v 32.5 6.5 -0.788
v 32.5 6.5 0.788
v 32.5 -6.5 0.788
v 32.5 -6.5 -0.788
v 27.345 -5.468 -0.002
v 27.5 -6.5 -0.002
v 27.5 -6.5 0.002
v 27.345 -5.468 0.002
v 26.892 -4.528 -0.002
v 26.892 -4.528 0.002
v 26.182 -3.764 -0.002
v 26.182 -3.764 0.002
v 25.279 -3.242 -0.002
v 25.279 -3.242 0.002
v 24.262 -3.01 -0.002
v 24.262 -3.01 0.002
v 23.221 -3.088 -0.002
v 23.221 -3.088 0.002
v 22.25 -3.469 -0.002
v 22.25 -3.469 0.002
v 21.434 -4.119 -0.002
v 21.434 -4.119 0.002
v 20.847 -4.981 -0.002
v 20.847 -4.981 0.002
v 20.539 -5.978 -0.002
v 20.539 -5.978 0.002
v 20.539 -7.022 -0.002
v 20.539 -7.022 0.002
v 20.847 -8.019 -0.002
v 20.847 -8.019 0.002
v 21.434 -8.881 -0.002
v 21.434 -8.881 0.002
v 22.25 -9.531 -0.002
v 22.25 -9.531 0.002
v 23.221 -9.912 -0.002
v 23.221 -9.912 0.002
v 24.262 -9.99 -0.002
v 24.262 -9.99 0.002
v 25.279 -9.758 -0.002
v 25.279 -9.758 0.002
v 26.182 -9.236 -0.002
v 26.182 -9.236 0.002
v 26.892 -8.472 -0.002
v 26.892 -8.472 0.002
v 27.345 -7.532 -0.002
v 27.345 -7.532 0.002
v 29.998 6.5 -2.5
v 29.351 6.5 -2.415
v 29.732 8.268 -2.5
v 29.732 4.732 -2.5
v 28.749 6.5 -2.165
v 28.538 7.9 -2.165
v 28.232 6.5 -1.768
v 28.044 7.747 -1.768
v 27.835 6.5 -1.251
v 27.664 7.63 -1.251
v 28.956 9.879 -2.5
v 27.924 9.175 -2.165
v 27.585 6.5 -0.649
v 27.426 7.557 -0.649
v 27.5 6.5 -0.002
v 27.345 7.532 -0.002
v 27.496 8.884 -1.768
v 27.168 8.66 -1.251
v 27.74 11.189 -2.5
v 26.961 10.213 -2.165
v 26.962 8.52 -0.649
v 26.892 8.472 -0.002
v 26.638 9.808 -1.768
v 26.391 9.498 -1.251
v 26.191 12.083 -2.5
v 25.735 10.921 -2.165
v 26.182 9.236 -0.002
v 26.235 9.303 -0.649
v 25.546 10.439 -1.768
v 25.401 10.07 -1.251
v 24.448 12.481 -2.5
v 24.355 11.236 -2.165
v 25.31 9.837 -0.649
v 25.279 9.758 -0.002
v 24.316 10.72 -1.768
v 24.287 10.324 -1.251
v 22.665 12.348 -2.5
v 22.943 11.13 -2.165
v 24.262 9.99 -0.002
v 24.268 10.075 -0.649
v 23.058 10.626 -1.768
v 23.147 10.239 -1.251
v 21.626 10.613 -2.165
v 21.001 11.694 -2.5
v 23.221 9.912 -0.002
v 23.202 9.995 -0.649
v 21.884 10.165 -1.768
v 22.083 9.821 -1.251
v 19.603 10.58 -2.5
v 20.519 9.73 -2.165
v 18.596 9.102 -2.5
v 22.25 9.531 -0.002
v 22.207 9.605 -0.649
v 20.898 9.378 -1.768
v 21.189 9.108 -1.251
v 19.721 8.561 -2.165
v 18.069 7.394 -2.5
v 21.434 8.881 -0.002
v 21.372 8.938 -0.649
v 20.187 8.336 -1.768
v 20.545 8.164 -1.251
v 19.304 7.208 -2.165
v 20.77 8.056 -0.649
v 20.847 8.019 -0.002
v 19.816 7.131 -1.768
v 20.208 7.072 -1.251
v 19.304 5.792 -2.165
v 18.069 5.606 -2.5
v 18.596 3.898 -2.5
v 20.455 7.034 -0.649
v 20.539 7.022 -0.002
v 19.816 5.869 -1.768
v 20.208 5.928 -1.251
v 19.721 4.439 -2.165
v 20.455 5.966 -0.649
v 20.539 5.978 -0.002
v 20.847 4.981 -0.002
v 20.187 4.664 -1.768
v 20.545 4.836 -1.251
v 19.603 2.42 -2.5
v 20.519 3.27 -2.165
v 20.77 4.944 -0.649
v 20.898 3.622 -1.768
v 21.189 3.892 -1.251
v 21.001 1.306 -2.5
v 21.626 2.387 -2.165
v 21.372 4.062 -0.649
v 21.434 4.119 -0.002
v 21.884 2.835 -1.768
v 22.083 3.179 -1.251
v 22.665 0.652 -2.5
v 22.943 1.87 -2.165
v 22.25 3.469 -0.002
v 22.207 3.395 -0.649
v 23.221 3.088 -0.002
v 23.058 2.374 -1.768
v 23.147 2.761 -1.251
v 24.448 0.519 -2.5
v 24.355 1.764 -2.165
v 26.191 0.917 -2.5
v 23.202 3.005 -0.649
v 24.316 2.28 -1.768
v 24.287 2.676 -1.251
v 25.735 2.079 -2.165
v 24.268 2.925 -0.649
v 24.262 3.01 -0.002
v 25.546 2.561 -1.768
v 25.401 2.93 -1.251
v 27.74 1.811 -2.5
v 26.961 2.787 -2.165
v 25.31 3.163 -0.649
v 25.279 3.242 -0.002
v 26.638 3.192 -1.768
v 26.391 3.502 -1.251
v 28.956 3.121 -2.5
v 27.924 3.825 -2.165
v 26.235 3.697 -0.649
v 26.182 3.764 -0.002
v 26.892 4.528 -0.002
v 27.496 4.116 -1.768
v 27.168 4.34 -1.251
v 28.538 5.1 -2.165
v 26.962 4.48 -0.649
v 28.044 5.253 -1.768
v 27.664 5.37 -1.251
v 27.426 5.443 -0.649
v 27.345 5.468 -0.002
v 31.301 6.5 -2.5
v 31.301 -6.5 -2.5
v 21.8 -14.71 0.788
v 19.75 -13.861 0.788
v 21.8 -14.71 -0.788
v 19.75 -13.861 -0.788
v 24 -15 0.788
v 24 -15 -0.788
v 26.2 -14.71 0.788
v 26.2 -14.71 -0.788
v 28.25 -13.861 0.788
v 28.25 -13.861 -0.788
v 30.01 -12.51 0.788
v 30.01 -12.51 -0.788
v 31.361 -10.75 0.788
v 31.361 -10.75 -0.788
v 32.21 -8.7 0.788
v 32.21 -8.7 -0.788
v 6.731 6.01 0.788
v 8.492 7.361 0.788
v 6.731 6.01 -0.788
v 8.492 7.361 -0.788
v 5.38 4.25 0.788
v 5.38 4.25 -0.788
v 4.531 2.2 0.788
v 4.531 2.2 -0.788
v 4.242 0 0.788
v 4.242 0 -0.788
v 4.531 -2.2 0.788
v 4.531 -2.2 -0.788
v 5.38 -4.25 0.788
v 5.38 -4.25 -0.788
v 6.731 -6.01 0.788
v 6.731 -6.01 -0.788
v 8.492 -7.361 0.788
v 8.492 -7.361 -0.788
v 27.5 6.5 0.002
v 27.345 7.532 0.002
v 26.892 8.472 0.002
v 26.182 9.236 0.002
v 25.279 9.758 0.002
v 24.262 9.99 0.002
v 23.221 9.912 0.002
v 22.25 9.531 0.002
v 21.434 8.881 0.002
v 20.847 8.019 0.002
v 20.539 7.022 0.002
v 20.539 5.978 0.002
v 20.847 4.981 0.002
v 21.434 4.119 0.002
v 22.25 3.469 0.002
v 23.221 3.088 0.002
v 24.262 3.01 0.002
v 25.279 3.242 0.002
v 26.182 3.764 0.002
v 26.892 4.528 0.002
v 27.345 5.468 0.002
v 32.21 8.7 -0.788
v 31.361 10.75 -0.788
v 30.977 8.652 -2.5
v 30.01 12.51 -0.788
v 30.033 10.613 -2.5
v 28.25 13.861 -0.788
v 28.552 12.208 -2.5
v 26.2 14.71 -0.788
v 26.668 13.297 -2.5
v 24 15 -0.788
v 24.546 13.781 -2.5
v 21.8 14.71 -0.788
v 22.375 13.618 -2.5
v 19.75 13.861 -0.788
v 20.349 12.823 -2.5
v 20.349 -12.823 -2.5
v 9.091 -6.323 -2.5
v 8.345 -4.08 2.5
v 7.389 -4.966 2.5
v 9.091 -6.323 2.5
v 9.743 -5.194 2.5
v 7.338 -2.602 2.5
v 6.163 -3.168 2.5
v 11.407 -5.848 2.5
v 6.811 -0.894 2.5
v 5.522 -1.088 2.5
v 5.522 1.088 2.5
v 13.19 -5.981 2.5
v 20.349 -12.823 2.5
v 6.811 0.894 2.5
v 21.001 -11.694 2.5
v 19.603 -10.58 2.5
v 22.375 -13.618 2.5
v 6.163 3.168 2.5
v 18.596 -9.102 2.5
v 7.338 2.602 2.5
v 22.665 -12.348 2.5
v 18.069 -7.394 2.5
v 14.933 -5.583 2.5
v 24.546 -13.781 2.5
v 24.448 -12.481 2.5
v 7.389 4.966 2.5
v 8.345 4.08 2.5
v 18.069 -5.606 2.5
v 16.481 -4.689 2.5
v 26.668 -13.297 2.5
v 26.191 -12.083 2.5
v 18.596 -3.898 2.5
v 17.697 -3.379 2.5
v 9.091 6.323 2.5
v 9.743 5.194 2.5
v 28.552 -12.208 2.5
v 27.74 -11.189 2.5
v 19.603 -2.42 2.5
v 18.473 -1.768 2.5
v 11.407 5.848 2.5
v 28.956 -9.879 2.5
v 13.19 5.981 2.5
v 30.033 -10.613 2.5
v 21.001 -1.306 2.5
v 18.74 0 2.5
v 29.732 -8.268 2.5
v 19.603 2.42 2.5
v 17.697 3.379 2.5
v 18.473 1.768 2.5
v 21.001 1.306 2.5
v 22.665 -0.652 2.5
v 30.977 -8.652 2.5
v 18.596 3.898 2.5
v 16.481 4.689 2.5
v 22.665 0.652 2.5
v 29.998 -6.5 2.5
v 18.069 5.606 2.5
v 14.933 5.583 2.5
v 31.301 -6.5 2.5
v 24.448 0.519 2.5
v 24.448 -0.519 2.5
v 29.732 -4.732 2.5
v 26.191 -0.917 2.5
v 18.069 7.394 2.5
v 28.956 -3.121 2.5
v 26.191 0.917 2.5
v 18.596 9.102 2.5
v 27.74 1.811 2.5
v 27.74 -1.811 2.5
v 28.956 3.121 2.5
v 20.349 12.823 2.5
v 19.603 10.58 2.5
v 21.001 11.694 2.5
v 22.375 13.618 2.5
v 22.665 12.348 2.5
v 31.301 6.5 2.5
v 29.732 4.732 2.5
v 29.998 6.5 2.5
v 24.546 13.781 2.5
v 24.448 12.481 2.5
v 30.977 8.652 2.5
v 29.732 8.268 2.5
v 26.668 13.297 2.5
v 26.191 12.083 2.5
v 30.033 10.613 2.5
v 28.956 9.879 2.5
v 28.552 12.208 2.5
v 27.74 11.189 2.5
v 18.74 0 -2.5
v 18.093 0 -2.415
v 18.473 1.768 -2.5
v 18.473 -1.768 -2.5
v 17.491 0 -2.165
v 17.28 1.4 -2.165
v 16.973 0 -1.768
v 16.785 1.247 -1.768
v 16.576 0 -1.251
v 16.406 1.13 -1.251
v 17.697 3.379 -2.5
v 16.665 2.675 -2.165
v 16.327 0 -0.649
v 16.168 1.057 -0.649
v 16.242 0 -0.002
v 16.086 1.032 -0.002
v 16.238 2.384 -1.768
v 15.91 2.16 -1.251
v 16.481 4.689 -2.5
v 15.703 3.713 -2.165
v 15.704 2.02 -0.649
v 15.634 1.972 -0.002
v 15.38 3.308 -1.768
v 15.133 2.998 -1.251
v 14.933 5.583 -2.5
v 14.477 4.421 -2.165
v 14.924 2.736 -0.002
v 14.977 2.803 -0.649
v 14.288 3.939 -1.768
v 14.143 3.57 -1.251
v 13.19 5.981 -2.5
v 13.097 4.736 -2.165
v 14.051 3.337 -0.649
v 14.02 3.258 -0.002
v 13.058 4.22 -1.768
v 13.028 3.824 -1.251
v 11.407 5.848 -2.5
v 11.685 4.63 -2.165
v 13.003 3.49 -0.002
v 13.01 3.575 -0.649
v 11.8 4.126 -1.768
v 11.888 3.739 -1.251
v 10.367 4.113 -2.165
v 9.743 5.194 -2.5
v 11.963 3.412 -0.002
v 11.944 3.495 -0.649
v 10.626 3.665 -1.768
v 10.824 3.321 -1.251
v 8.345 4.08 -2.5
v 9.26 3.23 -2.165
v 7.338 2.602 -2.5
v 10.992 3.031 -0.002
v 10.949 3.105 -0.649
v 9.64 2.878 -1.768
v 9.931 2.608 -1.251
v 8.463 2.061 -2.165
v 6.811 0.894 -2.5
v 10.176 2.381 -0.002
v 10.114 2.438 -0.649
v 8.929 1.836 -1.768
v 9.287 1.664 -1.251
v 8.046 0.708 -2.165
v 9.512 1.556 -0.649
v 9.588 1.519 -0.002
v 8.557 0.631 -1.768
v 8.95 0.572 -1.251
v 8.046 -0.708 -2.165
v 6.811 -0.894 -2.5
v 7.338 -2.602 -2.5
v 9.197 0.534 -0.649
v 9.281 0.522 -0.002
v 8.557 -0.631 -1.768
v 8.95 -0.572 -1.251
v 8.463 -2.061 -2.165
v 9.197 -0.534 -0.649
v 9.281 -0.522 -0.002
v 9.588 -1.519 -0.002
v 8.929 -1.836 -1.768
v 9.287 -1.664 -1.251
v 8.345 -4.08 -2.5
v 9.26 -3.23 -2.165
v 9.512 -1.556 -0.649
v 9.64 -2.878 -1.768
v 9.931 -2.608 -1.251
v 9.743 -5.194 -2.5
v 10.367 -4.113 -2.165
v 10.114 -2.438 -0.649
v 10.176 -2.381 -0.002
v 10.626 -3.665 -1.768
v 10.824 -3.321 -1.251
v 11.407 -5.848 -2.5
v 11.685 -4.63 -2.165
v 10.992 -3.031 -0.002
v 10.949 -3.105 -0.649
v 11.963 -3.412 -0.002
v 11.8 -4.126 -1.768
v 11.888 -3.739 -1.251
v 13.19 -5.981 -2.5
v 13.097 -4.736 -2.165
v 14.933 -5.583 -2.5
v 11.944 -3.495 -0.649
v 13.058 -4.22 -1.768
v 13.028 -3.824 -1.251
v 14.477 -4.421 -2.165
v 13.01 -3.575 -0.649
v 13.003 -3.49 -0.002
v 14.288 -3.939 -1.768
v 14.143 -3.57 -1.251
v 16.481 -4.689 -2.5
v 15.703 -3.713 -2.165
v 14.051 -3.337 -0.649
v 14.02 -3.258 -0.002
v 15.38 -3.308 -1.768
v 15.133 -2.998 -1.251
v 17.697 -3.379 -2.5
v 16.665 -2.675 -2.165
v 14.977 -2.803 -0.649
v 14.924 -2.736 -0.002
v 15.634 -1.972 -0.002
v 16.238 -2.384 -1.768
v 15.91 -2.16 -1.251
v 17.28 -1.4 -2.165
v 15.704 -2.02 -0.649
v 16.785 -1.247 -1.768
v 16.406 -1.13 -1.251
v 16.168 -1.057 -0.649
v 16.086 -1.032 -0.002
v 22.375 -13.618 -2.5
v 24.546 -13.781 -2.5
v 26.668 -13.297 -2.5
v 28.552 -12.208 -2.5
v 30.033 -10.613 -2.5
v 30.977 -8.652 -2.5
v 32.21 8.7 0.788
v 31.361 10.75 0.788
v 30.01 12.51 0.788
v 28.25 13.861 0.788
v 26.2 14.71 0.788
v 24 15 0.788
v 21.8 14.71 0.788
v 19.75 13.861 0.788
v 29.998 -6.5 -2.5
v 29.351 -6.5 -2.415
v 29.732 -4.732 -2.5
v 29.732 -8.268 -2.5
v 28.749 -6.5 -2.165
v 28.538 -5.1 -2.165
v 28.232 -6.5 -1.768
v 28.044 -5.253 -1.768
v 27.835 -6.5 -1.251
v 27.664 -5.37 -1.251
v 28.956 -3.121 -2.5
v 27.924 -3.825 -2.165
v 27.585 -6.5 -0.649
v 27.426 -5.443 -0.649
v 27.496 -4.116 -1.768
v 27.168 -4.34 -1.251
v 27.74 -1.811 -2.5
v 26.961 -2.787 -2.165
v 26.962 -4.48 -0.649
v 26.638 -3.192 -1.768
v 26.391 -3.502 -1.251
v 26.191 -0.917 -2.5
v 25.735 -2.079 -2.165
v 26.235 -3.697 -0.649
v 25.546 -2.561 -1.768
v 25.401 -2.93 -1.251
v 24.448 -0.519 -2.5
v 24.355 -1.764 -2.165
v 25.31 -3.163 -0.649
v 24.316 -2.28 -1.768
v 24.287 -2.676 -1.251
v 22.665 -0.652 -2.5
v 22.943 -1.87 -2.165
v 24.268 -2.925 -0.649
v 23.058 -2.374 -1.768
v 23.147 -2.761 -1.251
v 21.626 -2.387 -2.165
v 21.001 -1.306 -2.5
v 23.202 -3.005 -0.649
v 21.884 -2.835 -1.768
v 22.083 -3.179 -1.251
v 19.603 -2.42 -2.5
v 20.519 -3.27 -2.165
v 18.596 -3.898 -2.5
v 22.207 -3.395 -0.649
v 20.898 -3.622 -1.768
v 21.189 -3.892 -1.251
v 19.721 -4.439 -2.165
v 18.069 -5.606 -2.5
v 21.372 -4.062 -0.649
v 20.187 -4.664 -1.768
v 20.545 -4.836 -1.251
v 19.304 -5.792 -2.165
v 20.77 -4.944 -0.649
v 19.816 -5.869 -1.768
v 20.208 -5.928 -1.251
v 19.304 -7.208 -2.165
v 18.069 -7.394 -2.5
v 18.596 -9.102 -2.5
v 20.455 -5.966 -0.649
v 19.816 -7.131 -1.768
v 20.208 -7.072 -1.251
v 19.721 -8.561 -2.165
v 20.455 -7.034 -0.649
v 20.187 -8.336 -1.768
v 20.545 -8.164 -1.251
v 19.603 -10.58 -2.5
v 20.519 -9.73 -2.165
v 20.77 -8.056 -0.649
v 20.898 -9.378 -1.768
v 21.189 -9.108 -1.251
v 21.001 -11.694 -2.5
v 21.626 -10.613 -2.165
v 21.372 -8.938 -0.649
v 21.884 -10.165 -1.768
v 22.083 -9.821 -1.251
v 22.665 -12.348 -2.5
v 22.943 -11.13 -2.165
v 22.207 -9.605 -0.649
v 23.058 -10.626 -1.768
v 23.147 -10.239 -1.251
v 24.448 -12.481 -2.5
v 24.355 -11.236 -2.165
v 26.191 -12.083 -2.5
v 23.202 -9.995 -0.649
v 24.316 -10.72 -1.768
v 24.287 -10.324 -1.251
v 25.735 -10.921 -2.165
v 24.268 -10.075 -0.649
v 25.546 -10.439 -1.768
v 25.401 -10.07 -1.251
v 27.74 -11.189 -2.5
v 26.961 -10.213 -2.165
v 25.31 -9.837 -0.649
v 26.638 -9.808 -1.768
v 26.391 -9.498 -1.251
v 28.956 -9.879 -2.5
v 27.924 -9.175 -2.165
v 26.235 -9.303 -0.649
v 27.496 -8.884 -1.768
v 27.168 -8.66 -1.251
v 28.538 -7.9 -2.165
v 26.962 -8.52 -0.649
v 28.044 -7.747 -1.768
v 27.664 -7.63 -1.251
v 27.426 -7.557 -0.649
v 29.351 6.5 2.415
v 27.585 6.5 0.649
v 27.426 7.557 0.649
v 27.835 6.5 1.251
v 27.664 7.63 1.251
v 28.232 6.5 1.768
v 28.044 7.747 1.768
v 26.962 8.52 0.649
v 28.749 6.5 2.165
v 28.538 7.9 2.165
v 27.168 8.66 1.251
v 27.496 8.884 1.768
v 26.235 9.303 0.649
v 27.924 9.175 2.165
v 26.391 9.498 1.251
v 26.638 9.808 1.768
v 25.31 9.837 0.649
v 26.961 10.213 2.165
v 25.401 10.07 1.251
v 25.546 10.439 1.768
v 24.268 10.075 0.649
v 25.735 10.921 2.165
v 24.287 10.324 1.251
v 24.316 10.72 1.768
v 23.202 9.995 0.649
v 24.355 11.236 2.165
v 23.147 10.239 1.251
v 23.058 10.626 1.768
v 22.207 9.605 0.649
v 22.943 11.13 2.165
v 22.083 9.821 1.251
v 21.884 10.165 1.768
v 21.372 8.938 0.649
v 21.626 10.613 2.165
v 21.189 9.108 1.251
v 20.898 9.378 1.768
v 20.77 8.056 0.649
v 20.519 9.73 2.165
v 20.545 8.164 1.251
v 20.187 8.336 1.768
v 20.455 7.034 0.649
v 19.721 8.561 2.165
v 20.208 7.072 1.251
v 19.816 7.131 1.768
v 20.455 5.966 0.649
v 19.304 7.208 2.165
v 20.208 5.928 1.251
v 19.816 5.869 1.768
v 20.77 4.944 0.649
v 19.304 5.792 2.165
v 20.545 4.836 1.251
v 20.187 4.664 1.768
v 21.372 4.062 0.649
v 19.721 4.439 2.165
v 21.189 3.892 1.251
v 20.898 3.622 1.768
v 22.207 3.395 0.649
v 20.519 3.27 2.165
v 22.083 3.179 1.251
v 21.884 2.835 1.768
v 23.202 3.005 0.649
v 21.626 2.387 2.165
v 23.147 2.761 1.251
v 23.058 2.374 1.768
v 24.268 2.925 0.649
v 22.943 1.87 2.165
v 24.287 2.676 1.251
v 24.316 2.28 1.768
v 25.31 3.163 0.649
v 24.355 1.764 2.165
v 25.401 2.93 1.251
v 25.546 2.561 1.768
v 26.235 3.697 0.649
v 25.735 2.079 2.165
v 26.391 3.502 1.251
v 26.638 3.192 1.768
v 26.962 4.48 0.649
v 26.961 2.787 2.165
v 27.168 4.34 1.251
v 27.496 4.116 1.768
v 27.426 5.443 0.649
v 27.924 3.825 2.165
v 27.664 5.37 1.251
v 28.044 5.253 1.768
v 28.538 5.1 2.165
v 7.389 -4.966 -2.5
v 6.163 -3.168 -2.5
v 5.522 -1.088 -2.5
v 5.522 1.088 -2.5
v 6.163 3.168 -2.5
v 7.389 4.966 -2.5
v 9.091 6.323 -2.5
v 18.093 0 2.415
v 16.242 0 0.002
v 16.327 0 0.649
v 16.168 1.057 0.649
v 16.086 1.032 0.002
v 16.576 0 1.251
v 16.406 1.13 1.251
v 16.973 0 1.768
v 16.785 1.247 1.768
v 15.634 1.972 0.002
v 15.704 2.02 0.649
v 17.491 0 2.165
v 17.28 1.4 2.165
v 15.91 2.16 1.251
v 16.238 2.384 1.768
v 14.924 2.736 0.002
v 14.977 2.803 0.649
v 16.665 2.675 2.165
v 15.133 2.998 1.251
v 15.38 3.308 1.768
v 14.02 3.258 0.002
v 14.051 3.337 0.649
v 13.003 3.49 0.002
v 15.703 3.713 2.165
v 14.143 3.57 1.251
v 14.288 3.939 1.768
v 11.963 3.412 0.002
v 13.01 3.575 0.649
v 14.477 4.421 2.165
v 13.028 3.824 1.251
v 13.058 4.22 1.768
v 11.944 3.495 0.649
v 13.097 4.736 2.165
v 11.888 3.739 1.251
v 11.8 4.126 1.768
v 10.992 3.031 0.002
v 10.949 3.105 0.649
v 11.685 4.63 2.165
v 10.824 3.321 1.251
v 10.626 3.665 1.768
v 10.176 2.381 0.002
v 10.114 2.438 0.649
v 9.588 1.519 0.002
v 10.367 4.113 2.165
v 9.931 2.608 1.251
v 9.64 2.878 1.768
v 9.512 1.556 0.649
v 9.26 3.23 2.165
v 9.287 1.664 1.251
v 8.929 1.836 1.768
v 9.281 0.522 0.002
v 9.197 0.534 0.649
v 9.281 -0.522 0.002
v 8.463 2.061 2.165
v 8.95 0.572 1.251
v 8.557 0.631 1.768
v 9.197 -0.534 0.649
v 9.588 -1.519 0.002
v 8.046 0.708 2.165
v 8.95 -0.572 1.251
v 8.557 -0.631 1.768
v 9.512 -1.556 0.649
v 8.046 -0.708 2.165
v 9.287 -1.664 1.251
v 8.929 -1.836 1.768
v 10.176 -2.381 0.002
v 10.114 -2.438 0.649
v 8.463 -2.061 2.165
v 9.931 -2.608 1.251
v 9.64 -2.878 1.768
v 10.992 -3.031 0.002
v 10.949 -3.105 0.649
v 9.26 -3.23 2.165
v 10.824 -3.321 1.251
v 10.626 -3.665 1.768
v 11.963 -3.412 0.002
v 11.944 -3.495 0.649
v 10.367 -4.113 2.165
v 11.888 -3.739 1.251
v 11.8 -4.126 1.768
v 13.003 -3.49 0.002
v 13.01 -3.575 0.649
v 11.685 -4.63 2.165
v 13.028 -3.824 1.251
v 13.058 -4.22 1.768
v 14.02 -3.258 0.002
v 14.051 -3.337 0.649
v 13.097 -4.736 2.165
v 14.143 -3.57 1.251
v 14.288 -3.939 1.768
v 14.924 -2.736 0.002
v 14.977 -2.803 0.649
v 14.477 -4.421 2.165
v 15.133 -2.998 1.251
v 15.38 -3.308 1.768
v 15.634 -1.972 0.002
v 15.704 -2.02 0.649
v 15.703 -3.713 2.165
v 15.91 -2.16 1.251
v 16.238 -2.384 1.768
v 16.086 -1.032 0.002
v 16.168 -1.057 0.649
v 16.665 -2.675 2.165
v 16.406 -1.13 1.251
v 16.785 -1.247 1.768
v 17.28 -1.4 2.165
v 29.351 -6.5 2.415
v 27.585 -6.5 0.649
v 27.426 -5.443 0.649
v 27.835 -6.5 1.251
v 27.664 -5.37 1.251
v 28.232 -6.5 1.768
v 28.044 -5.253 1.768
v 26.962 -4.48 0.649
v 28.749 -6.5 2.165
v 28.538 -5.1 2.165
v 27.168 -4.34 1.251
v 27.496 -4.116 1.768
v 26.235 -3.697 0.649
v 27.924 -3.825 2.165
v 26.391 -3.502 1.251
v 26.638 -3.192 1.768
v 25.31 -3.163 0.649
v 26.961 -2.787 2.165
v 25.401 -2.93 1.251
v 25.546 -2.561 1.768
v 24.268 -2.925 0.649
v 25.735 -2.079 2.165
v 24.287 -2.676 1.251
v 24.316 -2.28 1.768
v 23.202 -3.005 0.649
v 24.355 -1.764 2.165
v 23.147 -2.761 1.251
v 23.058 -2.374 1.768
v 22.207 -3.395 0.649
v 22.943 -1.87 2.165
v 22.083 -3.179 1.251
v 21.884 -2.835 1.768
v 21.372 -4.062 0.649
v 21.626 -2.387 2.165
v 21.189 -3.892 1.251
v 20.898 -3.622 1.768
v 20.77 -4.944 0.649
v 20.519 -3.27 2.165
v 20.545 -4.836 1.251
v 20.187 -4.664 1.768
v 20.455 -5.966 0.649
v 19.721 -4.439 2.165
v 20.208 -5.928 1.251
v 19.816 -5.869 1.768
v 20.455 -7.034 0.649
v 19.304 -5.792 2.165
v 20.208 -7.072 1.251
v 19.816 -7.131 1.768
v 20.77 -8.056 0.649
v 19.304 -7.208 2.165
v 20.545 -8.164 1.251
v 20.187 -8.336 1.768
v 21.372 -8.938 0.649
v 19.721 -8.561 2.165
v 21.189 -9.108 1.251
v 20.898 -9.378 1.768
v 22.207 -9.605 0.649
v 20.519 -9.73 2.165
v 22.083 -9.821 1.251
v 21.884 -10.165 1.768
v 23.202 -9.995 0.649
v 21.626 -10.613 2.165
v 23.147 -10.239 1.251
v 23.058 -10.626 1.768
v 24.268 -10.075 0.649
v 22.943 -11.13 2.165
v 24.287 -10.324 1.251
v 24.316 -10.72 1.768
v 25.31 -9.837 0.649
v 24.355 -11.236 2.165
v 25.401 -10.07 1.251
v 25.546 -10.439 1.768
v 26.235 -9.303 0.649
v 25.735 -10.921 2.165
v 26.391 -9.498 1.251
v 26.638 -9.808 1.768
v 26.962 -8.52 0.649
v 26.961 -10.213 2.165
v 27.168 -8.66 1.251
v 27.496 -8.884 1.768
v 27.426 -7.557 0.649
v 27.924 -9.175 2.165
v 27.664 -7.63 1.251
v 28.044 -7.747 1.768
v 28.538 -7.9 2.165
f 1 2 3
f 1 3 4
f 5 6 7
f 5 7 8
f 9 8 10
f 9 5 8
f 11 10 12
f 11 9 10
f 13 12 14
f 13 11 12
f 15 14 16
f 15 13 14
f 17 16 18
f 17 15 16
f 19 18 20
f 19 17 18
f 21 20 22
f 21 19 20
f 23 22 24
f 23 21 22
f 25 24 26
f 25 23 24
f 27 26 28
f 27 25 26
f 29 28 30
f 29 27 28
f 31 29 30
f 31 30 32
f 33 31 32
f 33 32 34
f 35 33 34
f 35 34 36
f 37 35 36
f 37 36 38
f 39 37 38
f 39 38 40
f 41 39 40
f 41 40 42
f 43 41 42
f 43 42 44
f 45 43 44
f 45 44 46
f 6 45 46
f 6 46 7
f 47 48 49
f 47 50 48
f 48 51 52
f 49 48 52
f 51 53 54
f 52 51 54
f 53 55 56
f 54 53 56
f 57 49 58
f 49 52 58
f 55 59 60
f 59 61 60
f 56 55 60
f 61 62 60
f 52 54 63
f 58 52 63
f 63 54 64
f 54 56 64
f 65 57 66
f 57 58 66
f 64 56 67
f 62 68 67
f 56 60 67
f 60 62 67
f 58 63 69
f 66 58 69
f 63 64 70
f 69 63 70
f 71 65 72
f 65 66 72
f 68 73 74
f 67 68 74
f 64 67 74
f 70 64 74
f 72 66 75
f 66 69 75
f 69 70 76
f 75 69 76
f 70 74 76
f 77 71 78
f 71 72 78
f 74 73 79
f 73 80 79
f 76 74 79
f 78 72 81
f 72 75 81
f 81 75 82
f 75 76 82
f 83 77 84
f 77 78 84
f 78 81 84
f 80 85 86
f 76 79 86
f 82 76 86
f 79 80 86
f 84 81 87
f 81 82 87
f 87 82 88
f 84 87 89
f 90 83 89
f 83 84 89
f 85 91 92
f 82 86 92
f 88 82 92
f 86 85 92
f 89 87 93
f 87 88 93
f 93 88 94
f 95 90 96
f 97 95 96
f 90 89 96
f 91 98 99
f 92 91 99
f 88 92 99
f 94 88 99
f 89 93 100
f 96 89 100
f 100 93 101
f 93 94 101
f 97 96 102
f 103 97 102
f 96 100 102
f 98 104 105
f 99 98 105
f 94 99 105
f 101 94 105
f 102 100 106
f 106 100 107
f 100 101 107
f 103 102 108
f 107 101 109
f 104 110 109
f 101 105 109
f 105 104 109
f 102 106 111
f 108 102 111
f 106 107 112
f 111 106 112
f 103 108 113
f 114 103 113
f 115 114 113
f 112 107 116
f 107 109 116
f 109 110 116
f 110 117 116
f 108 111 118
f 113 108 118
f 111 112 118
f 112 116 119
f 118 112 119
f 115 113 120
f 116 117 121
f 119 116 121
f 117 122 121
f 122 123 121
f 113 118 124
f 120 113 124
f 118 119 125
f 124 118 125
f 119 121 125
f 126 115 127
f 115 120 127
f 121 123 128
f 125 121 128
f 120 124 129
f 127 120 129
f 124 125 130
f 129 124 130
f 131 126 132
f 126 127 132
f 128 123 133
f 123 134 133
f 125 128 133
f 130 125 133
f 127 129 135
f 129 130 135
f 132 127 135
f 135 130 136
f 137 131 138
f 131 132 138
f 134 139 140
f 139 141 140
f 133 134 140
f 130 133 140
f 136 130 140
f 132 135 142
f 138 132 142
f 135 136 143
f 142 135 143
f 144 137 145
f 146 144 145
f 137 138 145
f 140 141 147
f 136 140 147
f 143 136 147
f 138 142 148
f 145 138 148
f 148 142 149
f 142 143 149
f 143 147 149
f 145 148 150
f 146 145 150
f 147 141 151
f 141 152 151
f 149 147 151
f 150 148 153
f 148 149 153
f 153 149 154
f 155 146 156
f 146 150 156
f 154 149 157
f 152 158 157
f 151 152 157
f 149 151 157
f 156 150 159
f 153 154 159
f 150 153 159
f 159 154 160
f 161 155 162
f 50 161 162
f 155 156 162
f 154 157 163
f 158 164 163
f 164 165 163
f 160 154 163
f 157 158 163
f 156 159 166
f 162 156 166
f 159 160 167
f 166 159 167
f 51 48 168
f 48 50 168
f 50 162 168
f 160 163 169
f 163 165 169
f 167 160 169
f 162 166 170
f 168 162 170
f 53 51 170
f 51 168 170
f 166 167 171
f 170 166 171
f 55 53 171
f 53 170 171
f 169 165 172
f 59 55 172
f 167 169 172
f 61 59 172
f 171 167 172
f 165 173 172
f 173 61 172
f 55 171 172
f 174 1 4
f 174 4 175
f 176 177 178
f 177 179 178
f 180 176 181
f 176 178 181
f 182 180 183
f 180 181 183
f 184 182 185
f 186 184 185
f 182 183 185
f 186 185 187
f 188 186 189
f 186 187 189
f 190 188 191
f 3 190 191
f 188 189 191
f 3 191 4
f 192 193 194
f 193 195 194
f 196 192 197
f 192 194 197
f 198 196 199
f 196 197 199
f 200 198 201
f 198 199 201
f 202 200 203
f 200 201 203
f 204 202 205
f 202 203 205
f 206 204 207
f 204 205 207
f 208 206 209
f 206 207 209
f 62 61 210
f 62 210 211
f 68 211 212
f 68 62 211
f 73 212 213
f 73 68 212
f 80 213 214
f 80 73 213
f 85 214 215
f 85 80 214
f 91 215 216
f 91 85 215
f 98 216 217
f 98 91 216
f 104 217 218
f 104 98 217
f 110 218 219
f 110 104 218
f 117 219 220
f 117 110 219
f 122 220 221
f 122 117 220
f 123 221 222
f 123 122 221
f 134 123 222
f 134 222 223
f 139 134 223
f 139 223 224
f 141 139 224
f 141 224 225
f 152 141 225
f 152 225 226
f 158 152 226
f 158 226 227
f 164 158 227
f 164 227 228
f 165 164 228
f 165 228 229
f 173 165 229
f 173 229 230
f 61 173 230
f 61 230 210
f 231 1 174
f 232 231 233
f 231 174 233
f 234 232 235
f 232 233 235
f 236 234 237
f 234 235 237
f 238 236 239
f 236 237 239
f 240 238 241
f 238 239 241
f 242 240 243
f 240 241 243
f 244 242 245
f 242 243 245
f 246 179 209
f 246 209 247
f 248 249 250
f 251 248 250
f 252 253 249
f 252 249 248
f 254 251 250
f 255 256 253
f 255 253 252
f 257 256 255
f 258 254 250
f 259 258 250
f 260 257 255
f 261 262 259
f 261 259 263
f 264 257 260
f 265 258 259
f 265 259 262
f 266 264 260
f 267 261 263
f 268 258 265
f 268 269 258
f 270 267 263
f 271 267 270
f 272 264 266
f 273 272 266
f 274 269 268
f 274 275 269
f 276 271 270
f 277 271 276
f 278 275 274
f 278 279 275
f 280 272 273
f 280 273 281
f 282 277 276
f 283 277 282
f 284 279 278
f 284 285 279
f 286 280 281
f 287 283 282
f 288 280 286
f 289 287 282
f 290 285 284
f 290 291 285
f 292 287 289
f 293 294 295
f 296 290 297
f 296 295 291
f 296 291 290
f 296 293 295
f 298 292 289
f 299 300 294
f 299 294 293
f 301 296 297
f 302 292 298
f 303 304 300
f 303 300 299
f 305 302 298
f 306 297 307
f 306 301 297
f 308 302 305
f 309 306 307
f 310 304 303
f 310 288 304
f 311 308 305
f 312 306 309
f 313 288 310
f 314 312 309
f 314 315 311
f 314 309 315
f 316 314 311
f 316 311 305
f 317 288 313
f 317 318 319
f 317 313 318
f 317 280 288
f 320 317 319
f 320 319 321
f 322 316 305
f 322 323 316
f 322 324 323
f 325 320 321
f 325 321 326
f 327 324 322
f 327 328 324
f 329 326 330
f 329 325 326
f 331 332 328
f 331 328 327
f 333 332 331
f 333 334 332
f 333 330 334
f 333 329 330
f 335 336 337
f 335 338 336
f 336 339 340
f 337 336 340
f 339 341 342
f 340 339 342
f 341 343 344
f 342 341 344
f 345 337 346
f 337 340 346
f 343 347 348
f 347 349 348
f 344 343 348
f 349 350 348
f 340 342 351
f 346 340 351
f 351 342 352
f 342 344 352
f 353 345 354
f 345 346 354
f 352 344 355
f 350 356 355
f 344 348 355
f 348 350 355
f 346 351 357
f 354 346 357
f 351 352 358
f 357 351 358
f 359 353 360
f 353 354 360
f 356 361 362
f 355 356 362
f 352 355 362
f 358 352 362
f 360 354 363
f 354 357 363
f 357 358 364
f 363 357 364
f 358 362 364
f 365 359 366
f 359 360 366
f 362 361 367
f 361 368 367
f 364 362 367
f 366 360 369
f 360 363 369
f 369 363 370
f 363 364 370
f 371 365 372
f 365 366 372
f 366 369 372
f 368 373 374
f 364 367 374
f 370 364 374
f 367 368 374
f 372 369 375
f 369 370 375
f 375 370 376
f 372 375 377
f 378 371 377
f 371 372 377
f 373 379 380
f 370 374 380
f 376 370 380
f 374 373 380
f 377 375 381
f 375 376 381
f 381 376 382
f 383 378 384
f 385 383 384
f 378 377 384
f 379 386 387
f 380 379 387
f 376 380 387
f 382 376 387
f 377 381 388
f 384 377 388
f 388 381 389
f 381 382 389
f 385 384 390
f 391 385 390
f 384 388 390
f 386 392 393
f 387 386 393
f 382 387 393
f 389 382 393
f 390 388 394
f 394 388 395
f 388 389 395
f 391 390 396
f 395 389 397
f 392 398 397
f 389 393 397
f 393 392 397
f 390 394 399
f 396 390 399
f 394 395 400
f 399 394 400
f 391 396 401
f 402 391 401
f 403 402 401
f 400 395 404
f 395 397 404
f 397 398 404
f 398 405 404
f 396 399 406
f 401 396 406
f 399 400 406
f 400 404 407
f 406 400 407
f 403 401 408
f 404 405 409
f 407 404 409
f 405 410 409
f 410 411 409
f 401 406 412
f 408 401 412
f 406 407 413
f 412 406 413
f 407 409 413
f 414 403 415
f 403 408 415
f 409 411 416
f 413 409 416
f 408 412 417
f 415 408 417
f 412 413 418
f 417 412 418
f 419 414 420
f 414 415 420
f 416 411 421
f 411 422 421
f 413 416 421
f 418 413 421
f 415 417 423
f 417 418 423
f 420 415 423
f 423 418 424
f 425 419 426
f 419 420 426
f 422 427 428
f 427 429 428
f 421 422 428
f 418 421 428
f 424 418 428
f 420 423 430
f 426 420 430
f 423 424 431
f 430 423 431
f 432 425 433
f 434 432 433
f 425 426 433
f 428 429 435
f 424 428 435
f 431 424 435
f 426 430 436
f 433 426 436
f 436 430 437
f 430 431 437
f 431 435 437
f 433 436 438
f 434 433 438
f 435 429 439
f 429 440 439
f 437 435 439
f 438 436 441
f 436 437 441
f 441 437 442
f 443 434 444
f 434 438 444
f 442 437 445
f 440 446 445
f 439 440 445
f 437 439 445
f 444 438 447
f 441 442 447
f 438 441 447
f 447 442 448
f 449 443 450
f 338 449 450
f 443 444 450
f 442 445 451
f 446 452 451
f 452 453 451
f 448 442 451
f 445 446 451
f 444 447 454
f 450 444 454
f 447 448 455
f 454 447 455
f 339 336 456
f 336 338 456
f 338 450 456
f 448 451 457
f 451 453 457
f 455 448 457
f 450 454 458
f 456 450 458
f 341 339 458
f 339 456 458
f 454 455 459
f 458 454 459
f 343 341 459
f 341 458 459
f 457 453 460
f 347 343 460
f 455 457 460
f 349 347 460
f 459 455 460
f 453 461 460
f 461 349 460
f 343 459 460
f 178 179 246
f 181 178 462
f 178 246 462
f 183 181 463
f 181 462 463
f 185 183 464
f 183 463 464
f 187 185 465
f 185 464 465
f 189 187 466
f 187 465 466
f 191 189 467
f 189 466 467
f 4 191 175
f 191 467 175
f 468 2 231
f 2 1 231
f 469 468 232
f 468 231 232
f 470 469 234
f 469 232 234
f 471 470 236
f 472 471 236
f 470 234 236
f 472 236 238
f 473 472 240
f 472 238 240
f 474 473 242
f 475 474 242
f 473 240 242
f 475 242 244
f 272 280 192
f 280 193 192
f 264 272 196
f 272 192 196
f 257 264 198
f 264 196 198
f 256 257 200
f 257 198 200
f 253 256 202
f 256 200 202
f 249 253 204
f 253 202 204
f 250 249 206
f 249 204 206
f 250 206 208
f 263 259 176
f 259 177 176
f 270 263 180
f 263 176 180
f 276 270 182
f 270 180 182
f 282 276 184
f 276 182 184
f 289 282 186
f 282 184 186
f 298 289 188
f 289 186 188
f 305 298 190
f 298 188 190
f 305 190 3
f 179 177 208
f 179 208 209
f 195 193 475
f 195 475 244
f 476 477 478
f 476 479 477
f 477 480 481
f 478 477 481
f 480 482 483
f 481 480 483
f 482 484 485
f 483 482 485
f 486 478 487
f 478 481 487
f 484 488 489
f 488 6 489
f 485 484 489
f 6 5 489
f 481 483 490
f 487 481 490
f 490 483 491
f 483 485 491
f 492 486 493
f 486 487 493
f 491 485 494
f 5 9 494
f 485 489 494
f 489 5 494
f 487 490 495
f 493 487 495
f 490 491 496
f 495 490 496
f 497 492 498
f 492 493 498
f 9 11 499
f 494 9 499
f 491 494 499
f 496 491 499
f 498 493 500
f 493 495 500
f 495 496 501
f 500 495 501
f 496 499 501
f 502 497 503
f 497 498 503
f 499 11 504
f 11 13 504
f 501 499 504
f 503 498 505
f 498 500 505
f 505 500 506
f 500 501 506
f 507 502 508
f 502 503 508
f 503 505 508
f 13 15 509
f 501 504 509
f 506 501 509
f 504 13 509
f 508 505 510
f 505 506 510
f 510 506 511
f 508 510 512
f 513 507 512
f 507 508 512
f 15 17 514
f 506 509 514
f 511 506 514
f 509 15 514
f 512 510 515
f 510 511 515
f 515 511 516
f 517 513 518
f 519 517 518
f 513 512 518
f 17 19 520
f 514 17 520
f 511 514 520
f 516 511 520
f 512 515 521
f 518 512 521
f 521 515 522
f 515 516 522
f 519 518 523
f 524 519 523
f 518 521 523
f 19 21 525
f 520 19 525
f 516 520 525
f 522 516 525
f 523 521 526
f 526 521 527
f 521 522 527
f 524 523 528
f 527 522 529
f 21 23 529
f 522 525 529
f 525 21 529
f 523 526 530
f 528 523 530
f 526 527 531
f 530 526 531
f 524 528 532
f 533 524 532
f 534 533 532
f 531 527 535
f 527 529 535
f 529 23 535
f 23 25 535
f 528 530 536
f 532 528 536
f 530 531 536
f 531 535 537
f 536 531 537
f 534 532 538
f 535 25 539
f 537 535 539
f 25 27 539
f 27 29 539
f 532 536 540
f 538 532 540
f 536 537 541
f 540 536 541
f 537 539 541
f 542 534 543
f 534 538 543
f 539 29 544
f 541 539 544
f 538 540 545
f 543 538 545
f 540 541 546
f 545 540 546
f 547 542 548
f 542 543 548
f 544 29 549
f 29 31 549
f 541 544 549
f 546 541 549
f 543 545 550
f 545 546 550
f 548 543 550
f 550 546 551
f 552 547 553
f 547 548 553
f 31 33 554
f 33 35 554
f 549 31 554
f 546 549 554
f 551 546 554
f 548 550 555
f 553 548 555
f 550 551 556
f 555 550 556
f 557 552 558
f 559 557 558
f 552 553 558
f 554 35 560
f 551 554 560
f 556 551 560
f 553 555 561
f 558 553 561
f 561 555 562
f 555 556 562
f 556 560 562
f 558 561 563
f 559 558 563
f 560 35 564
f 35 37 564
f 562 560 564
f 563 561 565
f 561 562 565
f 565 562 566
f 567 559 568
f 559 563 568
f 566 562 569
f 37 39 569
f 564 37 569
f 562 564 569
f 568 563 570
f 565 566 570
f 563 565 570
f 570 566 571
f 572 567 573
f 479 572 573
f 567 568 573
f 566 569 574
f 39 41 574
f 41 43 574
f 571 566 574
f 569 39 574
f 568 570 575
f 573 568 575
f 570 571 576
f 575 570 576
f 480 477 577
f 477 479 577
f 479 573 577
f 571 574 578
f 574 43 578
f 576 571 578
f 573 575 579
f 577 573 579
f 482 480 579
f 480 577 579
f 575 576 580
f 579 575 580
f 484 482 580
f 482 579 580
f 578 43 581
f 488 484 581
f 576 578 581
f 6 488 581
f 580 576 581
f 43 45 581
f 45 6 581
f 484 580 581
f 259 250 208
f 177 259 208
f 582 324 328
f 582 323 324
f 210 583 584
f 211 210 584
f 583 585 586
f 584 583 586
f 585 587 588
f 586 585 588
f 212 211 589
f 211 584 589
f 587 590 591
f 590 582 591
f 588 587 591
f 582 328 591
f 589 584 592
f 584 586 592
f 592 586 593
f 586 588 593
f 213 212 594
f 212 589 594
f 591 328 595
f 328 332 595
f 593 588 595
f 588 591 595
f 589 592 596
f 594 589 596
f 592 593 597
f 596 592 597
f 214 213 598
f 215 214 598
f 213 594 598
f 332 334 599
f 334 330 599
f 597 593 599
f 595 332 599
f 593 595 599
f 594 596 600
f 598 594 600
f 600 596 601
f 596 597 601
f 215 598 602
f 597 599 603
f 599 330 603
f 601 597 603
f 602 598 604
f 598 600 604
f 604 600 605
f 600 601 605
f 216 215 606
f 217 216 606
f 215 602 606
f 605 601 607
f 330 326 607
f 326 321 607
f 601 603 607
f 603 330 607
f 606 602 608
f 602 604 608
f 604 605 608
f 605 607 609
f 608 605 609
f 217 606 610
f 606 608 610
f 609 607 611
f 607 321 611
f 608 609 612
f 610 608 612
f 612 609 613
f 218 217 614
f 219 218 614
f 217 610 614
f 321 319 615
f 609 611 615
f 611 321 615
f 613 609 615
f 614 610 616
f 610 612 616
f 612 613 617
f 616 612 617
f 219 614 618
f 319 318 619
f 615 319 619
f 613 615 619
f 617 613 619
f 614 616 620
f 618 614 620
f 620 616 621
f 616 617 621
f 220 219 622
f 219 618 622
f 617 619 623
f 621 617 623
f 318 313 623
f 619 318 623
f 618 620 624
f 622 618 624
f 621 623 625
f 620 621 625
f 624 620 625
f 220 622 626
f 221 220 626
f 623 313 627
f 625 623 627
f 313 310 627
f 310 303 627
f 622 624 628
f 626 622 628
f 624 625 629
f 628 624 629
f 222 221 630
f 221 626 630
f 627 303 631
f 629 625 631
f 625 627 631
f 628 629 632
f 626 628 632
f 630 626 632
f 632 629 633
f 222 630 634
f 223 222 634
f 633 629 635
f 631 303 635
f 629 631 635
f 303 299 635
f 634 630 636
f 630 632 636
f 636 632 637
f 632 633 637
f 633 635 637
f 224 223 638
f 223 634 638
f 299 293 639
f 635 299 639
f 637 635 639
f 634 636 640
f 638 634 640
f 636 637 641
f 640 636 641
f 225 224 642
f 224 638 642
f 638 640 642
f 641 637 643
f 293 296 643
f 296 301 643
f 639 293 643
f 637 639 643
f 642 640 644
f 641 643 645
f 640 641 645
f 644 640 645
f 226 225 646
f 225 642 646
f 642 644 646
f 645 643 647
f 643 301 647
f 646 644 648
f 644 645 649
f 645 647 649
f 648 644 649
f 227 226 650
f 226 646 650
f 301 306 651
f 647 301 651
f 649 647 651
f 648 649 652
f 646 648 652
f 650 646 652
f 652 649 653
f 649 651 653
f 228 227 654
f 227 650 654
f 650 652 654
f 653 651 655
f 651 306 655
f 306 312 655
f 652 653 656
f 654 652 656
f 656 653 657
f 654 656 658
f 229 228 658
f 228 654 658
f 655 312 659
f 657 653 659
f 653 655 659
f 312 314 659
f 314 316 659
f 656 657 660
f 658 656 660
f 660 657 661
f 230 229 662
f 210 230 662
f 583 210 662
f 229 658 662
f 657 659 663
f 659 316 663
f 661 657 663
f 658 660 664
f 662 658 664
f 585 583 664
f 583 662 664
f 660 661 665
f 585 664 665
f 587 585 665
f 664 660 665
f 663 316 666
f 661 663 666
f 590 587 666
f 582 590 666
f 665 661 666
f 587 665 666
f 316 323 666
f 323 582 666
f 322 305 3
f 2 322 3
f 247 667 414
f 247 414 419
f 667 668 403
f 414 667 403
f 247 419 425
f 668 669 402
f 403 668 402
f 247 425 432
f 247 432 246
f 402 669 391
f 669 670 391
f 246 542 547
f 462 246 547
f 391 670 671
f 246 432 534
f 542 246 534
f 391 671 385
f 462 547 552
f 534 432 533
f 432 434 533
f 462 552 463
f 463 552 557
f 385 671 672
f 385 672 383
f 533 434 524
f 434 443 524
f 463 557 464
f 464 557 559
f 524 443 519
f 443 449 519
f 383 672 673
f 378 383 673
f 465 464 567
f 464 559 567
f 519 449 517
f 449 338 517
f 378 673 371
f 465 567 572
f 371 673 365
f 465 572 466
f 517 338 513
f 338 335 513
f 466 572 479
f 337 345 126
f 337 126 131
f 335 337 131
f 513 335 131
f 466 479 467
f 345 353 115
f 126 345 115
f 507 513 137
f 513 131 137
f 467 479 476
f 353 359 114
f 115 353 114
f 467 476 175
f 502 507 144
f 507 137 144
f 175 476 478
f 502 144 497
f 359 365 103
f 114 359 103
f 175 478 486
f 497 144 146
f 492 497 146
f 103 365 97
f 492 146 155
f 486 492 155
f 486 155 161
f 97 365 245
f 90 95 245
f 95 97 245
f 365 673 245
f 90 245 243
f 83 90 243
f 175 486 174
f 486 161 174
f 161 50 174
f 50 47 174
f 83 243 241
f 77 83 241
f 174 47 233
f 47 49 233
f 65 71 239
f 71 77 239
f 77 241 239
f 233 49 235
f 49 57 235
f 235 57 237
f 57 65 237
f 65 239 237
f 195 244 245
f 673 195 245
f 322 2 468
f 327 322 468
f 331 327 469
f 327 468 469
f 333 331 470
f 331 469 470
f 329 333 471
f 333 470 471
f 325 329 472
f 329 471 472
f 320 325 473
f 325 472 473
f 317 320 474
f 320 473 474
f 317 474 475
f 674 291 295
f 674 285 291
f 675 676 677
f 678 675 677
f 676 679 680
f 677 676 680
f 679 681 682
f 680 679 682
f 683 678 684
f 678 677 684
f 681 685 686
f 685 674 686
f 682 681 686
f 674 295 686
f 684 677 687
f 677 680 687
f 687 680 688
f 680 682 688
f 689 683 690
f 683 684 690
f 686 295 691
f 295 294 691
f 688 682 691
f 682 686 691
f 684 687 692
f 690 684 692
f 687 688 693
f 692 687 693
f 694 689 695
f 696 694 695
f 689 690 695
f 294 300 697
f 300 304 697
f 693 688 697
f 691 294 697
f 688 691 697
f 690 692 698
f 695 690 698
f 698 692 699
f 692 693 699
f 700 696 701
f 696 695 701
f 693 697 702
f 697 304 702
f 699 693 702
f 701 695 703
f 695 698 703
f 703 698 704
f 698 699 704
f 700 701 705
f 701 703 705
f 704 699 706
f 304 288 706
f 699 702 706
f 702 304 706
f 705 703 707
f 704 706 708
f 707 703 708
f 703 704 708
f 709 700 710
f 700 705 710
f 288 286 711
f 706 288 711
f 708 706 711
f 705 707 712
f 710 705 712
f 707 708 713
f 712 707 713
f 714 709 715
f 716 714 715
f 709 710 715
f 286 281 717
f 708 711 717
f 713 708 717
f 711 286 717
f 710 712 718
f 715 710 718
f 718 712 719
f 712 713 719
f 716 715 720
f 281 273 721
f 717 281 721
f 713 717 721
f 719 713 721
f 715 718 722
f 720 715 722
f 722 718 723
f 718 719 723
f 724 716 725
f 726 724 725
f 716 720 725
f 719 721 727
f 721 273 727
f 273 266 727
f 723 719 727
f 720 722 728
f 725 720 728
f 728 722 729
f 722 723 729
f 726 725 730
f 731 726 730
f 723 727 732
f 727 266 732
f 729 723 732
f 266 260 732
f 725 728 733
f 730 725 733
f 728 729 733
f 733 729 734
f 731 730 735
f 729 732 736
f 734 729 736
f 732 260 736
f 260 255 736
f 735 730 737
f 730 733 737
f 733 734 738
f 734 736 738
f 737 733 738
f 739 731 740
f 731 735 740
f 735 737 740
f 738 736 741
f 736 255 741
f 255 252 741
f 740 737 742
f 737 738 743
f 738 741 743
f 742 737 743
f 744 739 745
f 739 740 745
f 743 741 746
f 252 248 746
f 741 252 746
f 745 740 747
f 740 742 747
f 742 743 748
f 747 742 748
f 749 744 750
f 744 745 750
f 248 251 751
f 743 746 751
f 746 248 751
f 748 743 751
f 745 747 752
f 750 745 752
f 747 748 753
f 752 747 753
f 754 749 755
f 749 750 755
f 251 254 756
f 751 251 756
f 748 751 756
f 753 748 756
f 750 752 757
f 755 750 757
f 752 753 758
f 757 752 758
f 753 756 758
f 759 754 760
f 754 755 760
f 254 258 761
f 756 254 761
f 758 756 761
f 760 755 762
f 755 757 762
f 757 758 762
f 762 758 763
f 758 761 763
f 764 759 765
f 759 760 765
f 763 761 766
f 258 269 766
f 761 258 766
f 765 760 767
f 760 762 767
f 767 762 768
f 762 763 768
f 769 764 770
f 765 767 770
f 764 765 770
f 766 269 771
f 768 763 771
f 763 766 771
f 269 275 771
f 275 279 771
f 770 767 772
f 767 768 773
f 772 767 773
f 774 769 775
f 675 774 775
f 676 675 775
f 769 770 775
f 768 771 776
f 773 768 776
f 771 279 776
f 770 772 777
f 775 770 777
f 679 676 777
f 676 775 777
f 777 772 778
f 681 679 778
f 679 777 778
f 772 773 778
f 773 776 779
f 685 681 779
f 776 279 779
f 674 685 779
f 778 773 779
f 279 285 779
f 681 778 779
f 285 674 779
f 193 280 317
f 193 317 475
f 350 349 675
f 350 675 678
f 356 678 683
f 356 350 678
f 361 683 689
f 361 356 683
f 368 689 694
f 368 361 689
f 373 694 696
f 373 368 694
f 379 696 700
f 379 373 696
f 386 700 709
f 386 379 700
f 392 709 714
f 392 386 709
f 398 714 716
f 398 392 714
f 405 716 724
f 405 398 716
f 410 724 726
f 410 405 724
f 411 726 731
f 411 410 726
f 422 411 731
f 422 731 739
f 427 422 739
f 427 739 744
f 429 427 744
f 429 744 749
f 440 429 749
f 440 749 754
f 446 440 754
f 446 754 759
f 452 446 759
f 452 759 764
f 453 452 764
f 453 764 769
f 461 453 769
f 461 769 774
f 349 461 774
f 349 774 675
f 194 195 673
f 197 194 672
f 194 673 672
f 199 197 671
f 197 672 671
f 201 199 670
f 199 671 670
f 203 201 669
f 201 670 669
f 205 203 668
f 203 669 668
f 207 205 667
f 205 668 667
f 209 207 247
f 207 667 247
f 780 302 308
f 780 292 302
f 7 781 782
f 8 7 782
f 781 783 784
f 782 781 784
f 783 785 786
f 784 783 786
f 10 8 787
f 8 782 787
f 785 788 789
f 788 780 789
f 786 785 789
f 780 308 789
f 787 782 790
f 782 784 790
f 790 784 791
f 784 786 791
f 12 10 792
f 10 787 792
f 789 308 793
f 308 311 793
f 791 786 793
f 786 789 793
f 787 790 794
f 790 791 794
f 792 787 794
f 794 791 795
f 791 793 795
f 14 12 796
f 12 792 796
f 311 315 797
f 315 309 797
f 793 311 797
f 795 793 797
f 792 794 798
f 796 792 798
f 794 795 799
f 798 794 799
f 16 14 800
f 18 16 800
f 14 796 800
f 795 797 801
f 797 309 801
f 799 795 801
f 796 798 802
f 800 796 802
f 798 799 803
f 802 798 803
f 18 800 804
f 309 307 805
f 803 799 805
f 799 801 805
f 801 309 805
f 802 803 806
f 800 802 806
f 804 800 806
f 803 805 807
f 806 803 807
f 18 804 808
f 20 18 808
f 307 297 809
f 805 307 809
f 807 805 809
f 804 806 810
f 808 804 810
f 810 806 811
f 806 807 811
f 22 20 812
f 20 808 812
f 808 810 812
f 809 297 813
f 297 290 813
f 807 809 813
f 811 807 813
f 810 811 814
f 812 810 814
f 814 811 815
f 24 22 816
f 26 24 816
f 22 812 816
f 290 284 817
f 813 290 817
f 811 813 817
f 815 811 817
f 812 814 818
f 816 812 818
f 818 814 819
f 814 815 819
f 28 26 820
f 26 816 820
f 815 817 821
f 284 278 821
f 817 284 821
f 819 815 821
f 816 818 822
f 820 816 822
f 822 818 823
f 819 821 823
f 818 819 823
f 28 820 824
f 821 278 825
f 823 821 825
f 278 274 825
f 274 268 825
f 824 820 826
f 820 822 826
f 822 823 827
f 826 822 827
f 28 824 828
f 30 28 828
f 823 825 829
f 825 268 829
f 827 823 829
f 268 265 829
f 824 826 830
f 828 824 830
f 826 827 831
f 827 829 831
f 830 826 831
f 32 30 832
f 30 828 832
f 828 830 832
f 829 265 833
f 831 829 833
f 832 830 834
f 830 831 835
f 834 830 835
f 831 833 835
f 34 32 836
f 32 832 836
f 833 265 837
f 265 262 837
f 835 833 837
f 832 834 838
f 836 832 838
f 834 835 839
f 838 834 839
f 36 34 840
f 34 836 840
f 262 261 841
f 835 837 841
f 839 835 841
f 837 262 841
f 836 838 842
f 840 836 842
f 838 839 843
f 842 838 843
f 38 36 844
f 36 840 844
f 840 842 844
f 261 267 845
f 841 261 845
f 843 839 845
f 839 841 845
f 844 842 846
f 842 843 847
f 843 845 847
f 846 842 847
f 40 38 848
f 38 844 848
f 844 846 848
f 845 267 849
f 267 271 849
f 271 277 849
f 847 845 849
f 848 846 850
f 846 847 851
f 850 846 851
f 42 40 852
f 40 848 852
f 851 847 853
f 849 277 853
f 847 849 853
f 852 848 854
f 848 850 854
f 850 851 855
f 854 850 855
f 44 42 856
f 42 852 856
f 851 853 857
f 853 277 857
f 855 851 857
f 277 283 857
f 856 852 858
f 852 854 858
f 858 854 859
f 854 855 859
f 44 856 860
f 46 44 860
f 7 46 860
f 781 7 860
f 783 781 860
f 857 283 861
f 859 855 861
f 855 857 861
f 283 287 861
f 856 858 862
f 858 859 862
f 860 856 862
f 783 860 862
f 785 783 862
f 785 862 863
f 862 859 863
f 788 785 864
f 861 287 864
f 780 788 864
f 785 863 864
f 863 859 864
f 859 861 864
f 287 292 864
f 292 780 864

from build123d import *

# Parameters (mm, degrees)
SKETCH006_R  = 3.5
PAD001_DEPTH = 2.5
FILLET_R     = 2.498


with BuildPart() as part:
    # Sketch006 → Pad001 (new body, symmetric)
    with BuildSketch(Plane.XY):
        with BuildLine():
            Line((8.6, 0), (8.6, 6.5))
            ThreePointArc((8.6, 6.5), (4.3, 13.947818), (-4.3, 13.947818))
            Line((-4.3, 13.947818), (-15.55833, 7.447818))
            ThreePointArc((-15.55833, 7.447818), (-19.85833, 0), (-15.55833, -7.447818))
            Line((-15.55833, -7.447818), (-4.299965, -13.947839))
            ThreePointArc((-4.299965, -13.947839), (4.300019, -13.947807), (8.6, -6.499997))
            Line((8.6, -6.499997), (8.6, 0))
        make_face()
        with Locations((-11.25833, 0)):
            Circle(SKETCH006_R, mode=Mode.SUBTRACT)
        with Locations((0, 6.5)):
            Circle(SKETCH006_R, mode=Mode.SUBTRACT)
        with Locations((0, -6.5)):
            Circle(SKETCH006_R, mode=Mode.SUBTRACT)
    extrude(amount=PAD001_DEPTH, both=True)

    # SubtractivePipe: sweep along a path in Sketch007
    with BuildLine(Plane.XY) as subtractivepipe_path:
        Line((8.75, 0), (8.75, 6.5))
        ThreePointArc((8.75, 6.5), (4.375, 14.077722), (-4.375, 14.077722))
        Line((-4.375, 14.077722), (-15.63333, 7.577722))
        ThreePointArc((-15.63333, 7.577722), (-20.00833, 0), (-15.63333, -7.577722))
        Line((-15.63333, -7.577722), (-4.375, -14.077722))
        ThreePointArc((-4.375, -14.077722), (4.375, -14.077722), (8.75, -6.5))
        Line((8.75, -6.5), (8.75, 0))
    # Sketch008 → SubtractivePipe (sweep, cut)
    with BuildSketch(Plane.XZ):
        Polygon((7.231397, 2.6), (8.5, 0.788247), (8.5, -0.788247), (7.231397, -2.6), (9, -2.6), (9, 2.6), align=None)
    sweep(path=subtractivepipe_path.line, mode=Mode.SUBTRACT)

    # Fillet
    fillet_edges = [part.edges().sort_by_distance(p)[0] for p in [
        (-3.5, -6.5, -2.5),
        (-3.5, 6.5, -2.5),
        (-14.75833, 0, -2.5),
        (-3.5, -6.5, 2.5),
        (-3.5, 6.5, 2.5),
        (-14.75833, 0, 2.5),
    ]]
    fillet(fillet_edges, radius=FILLET_R)


with BuildPart() as part_1:
    # Body003 placement: moved
    add(part.part.moved(Location((24, 0, 0))))


solid = part_1.part
